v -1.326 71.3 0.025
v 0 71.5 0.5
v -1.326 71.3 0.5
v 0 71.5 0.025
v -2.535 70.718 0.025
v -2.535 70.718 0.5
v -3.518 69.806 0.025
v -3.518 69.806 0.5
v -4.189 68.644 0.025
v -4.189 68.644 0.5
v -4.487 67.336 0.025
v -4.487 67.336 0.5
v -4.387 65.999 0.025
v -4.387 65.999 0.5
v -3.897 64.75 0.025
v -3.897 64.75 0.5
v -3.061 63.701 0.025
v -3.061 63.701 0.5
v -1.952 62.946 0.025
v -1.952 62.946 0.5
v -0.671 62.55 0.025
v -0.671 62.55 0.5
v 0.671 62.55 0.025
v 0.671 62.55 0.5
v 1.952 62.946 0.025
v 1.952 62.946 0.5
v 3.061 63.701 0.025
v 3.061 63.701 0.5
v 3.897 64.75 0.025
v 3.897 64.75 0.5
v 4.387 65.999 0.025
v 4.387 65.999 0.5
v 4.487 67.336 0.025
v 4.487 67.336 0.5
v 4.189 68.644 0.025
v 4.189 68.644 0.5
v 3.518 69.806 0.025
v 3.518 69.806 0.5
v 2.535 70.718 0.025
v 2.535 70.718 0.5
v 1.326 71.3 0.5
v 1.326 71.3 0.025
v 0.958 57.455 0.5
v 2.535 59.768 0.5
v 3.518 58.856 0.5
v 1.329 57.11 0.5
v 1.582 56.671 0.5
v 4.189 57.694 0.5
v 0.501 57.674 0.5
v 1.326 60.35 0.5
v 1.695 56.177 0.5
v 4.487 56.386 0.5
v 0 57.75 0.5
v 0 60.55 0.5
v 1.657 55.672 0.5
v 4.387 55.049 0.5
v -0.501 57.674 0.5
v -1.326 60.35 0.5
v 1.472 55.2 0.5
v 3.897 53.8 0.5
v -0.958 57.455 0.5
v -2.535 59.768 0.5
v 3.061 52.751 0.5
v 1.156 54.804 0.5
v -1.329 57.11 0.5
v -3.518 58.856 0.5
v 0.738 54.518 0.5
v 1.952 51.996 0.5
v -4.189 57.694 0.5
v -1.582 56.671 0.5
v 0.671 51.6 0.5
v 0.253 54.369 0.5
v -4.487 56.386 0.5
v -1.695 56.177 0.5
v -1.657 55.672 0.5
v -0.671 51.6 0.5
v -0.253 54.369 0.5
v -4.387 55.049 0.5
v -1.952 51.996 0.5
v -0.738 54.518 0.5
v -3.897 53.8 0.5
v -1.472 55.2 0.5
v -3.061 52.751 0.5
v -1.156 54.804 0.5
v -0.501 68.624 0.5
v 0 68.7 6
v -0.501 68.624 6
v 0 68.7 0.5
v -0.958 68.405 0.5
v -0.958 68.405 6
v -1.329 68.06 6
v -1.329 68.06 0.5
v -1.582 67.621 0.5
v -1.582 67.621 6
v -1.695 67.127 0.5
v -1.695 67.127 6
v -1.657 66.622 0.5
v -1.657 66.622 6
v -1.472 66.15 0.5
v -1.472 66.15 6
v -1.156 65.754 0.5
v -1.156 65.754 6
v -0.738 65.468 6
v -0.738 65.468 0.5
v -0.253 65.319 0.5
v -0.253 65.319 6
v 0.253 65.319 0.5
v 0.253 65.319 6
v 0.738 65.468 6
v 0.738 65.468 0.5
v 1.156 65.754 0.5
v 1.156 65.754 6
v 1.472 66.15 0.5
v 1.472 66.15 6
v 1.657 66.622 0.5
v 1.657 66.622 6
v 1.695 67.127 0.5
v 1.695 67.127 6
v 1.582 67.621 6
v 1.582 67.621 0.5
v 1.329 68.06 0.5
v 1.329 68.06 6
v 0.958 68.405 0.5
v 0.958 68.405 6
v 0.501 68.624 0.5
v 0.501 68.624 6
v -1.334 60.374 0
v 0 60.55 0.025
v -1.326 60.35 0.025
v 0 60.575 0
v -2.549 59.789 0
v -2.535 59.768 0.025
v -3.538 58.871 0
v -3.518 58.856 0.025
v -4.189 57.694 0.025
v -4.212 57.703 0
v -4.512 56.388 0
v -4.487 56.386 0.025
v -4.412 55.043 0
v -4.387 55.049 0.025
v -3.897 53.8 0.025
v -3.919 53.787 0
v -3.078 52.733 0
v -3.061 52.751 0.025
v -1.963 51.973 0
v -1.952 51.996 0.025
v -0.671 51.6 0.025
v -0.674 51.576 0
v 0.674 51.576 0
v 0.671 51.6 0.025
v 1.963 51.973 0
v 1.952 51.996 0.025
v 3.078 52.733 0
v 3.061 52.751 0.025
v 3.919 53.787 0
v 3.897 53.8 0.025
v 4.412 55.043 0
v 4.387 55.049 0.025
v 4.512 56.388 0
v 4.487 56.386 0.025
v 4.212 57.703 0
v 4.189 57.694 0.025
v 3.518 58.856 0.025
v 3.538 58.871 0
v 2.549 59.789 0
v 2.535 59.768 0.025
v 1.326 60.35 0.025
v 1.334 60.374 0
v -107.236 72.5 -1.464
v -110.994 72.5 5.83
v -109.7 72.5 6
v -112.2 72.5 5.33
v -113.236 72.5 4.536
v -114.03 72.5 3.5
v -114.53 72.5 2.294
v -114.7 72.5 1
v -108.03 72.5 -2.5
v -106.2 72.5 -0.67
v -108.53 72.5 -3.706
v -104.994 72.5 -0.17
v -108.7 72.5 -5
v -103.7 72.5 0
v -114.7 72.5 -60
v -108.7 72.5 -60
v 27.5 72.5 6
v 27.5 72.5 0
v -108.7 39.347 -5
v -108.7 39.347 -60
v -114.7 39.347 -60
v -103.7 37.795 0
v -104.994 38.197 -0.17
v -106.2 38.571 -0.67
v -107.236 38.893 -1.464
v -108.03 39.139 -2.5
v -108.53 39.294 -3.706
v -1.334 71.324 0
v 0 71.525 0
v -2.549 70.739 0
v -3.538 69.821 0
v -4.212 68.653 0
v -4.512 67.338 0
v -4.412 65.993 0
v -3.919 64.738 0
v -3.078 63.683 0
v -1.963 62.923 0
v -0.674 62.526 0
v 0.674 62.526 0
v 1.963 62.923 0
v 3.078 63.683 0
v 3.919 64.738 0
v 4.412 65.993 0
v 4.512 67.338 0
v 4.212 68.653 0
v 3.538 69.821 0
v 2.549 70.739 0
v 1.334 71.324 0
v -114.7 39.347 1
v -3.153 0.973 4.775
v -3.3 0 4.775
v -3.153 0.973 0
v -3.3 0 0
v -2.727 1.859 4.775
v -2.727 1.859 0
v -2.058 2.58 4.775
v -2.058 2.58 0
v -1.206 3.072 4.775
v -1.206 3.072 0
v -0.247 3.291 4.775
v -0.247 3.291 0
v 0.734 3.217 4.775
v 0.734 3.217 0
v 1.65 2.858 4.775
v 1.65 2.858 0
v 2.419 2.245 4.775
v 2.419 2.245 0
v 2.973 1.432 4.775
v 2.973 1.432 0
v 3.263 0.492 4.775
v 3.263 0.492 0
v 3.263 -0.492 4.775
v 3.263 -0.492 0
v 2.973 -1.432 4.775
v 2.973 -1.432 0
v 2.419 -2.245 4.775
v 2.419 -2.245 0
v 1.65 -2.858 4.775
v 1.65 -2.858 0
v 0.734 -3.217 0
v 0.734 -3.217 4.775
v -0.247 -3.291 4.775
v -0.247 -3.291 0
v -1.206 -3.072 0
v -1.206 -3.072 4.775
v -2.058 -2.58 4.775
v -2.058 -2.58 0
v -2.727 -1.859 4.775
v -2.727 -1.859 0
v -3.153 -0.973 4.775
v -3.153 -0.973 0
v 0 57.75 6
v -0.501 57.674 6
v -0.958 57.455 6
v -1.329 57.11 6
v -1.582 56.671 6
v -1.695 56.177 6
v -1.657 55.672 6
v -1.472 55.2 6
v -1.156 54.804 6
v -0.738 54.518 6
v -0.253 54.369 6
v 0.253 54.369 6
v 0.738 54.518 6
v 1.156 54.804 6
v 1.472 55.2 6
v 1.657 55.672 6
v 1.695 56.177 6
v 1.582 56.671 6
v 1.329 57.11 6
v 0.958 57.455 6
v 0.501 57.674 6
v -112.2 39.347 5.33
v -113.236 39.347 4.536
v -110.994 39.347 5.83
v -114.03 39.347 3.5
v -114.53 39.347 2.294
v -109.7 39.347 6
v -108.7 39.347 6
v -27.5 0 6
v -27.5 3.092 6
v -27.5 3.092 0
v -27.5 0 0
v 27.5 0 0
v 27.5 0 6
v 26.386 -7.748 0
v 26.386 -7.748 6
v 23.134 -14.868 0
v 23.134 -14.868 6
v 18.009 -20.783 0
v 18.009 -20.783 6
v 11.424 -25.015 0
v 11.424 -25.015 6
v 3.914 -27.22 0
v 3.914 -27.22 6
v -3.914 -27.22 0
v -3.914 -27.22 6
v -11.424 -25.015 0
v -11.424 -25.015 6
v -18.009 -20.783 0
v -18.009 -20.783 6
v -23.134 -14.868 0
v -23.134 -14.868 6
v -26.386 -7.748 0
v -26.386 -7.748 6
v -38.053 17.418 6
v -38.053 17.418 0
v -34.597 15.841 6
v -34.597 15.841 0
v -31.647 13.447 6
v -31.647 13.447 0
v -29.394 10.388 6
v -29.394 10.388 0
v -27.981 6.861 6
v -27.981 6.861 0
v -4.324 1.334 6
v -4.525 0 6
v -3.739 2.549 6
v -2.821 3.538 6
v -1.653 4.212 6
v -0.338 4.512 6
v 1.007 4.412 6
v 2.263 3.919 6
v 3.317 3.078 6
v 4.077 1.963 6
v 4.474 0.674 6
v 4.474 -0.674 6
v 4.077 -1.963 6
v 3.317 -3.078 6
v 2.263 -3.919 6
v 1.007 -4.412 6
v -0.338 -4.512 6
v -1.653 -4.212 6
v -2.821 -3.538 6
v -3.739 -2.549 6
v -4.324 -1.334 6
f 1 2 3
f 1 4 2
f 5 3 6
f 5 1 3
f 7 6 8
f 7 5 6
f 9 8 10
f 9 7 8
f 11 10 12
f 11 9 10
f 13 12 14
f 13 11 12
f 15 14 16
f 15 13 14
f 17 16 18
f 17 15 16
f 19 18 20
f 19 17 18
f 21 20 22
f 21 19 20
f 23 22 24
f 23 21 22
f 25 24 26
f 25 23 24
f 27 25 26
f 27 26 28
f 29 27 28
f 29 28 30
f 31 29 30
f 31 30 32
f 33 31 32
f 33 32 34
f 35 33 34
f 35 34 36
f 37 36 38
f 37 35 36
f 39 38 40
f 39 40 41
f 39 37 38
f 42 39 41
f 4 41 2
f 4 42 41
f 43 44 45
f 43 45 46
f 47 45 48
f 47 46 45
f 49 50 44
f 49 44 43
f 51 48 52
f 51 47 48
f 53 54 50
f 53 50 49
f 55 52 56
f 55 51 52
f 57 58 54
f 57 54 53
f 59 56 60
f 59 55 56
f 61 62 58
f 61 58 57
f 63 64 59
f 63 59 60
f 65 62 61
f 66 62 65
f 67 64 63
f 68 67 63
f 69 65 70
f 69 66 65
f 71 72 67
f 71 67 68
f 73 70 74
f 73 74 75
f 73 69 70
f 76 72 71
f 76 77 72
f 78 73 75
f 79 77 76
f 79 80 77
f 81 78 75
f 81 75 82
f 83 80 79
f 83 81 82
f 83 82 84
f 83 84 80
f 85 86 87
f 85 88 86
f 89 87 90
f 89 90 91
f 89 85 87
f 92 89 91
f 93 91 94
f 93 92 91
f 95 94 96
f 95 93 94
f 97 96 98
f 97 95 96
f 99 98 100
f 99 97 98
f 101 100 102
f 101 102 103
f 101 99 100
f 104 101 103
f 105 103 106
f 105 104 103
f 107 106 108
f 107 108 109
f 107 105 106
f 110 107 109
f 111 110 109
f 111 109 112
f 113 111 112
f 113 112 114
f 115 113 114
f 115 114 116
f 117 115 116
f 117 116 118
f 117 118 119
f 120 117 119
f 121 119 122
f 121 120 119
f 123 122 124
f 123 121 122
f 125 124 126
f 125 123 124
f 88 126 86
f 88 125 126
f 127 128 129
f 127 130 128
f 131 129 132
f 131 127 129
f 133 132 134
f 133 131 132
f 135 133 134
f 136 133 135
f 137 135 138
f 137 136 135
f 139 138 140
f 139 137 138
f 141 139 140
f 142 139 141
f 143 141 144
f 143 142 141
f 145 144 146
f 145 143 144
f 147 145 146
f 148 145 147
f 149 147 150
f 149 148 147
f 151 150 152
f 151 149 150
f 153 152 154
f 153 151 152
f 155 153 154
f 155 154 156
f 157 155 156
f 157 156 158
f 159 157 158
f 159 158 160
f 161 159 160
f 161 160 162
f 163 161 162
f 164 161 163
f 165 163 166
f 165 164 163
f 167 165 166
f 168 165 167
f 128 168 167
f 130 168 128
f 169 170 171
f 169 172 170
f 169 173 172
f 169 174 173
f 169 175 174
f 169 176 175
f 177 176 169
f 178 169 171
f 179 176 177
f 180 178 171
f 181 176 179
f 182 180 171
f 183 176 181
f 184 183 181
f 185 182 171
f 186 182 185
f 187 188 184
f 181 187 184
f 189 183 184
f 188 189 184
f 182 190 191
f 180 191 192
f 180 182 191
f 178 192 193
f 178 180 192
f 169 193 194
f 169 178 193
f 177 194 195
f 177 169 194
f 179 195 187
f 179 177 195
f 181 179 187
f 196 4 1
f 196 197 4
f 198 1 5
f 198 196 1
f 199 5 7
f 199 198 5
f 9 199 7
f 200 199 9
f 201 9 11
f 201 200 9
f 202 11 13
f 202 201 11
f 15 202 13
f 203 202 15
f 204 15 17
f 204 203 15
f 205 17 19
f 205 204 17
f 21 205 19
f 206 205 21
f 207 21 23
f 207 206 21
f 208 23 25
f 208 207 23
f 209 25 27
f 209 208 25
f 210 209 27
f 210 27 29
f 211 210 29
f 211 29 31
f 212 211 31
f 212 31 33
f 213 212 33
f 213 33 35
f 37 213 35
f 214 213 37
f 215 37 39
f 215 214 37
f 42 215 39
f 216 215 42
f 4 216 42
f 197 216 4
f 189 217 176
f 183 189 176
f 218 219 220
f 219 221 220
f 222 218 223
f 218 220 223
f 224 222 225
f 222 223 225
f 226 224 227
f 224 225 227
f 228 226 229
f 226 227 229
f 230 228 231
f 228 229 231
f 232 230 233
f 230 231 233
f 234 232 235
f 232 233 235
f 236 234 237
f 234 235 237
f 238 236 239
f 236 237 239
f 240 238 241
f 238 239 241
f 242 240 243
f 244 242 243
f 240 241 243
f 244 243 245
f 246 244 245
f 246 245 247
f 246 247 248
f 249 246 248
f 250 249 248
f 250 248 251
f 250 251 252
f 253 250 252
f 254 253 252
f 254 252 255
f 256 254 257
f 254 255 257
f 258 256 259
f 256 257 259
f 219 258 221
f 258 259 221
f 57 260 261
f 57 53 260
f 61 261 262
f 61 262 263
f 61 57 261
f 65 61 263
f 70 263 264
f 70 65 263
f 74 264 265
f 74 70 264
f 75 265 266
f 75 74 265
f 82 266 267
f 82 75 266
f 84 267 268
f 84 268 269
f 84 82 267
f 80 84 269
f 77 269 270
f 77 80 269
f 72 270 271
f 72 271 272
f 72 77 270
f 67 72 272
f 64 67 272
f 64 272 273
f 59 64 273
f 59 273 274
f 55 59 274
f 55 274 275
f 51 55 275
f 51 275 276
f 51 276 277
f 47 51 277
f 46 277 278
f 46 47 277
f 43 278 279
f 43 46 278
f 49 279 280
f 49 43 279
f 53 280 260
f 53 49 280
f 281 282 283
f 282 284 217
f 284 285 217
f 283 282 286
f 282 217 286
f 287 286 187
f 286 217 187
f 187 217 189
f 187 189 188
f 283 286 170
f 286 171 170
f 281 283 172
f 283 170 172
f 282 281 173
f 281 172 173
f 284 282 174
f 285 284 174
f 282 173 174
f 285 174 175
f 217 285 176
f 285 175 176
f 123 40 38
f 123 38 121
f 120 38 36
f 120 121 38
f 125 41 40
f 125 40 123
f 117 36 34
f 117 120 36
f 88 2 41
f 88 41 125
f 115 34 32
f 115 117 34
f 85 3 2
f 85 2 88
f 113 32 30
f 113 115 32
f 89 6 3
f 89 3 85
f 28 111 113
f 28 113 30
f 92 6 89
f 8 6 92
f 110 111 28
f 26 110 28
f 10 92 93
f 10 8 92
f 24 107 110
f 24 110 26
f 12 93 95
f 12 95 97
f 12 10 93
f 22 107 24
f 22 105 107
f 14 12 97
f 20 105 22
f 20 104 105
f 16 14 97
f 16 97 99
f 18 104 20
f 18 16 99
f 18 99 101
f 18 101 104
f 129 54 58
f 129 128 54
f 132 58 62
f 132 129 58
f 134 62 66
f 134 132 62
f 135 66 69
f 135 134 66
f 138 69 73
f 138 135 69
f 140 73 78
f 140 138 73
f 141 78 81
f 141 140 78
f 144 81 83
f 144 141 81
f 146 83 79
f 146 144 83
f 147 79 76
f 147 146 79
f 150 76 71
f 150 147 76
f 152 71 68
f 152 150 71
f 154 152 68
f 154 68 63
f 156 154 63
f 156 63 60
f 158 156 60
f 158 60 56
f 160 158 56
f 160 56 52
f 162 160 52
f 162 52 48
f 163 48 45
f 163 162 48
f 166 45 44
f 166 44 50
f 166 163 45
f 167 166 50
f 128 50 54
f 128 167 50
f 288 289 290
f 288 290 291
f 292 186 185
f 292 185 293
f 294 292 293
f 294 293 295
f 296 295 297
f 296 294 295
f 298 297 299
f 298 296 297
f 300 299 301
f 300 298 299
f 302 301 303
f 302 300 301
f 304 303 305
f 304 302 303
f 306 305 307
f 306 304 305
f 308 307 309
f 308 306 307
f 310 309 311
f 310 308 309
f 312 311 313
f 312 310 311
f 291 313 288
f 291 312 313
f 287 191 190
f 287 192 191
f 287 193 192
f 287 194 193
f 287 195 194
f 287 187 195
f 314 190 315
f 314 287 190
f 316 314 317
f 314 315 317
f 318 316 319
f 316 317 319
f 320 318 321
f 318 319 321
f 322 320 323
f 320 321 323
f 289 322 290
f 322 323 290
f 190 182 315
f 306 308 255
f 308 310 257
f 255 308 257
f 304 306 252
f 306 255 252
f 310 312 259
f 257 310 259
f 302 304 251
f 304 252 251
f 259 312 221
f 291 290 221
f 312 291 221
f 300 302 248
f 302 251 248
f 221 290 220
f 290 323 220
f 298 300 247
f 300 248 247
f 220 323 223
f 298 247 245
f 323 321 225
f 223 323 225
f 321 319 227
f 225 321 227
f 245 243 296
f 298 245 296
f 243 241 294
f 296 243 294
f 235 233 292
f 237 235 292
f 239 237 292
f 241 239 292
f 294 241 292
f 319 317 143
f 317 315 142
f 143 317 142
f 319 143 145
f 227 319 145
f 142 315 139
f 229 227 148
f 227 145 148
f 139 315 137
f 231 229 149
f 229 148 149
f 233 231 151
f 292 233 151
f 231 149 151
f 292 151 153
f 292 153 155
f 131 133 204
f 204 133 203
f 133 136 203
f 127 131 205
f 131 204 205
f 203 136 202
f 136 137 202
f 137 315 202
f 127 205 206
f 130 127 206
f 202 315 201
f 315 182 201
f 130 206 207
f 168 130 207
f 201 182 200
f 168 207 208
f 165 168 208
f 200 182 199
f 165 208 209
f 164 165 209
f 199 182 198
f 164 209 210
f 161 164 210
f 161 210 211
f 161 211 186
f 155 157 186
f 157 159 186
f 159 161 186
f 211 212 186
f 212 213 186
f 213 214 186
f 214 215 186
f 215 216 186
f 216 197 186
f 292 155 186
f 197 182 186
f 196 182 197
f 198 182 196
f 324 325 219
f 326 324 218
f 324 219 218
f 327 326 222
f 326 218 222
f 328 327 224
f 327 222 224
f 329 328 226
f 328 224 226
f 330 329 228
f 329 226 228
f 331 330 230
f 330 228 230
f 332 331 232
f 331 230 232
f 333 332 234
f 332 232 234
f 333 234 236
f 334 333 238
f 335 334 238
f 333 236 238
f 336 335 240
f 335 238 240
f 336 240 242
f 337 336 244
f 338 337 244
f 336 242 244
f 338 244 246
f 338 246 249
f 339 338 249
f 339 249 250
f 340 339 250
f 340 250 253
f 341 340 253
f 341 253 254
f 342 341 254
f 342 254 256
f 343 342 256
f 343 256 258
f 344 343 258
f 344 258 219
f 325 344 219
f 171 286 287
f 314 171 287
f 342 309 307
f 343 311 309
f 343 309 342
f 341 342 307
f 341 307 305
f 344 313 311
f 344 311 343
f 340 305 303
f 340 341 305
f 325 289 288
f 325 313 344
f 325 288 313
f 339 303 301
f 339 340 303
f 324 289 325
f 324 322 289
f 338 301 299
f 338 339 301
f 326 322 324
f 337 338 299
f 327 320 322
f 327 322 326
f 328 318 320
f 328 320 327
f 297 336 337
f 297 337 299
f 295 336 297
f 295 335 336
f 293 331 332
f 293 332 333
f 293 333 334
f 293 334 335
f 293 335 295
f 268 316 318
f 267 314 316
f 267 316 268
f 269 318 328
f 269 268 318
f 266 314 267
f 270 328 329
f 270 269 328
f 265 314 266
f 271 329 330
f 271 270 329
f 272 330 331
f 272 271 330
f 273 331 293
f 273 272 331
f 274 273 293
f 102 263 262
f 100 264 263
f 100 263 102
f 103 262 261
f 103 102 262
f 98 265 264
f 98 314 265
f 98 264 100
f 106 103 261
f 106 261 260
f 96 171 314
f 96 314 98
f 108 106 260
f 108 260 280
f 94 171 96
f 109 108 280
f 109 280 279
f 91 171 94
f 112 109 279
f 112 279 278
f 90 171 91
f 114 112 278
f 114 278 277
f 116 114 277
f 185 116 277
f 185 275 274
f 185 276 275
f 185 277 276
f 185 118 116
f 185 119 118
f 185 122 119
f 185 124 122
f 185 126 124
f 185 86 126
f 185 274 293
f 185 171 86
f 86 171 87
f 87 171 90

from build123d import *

# Parameters (mm, degrees)
ESTRUSIONE_ESTRUSIONE1_DEPTH                 = 6
SCHIZZO3_W                                   = 136.2
SCHIZZO3_H                                   = 72.5
ESTRUSIONE_ESTRUSIONE2_DEPTH                 = 6
TAGLIO_ESTRUSIONE1_DEPTH                     = 131.797324132
RACCORDO5_R                                  = 15
ESTRUSIONE_ESTRUSIONE5_DEPTH                 = 6
ESTRUSIONE_ESTRUSIONE5_DEPTH_BACK            = 60
SCHIZZO9_W                                   = 6
SCHIZZO9_H                                   = 33.15279029
RACCORDO6_R                                  = 5
RACCORDO7_R                                  = 5
FORO_FILETTATO_G1_16_1_D                     = 6.6
FORO_FILETTATO_G1_16_1_CSINK_D               = 9.05
FORO_FILETTATO_G1_16_1_CSINK_ANGLE           = 90
FORO_LAMATO_PER_BULLONE_M3_A_TESTA_E_2_COUNT = 2
FORO_LAMATO_PER_BULLONE_M3_A_TESTA_E_2_PITCH = 10.95


with BuildPart() as part:
    # Schizzo2 → Estrusione-Estrusione1 (new body)
    with BuildSketch(Plane.XY):
        with BuildLine():
            Line((-27.5, 0), (-27.5, 45))
            ThreePointArc((-27.5, 45), (0, 72.5), (27.5, 45))
            Line((27.5, 45), (27.5, 0))
            ThreePointArc((27.5, 0), (0, -27.5), (-27.5, 0))
        make_face()
    extrude(amount=ESTRUSIONE_ESTRUSIONE1_DEPTH)

    # Schizzo3 → Estrusione-Estrusione2 (add)
    with BuildSketch(Plane.XY):
        with Locations((-40.6, 36.25)):
            Rectangle(SCHIZZO3_W, SCHIZZO3_H)
    extrude(amount=ESTRUSIONE_ESTRUSIONE2_DEPTH)

    # Schizzo4 → Taglio-Estrusione1 (cut, through all)
    with BuildSketch(Plane.XY.offset(6)):
        Polygon((-27.5, 0), (-108.7, 0), (-108.7, 39.34720971), (-27.5, 14.142426235), align=None)
    extrude(amount=-TAGLIO_ESTRUSIONE1_DEPTH, mode=Mode.SUBTRACT)

    # Raccordo5
    raccordo5_edges = [part.edges().sort_by_distance(p)[0] for p in [
        (-27.5, 14.142426235, 3),
    ]]
    fillet(raccordo5_edges, radius=RACCORDO5_R)

    # Schizzo9 → Estrusione-Estrusione5 (add, two sides: drawn at the far end of the back side and taken through both)
    with BuildSketch(Plane.XY.offset(-ESTRUSIONE_ESTRUSIONE5_DEPTH_BACK)):
        with Locations((-111.7, 55.923604855)):
            Rectangle(SCHIZZO9_W, SCHIZZO9_H)
    extrude(amount=ESTRUSIONE_ESTRUSIONE5_DEPTH + ESTRUSIONE_ESTRUSIONE5_DEPTH_BACK)

    # Raccordo6
    raccordo6_edges = [part.edges().sort_by_distance(p)[0] for p in [
        (-108.7, 55.923604855, 0),
    ]]
    fillet(raccordo6_edges, radius=RACCORDO6_R)

    # Raccordo7
    raccordo7_edges = [part.edges().sort_by_distance(p)[0] for p in [
        (-114.7, 55.923604855, 6),
    ]]
    fillet(raccordo7_edges, radius=RACCORDO7_R)

    # Foro filettato G1/16-1 (through all)
    with Locations(Plane.XY.offset(6)):
        with Locations((0, 0)):
            CounterSinkHole(FORO_FILETTATO_G1_16_1_D / 2, FORO_FILETTATO_G1_16_1_CSINK_D / 2, counter_sink_angle=FORO_FILETTATO_G1_16_1_CSINK_ANGLE)

    # Schizzo20 → Foro lamato per Bullone M3 a testa esagonale-3 (revolve, cut)
    with BuildSketch(Plane(origin=(0, 67, 0), x_dir=(0, 1, 0), z_dir=(1, 0, 0))):
        Polygon((0, 0), (0, 6), (1.7, 6), (1.7, 0.5), (4.5, 0.5), (4.5, 0.025), (4.525, 0), align=None)
    foro_lamato_per_bullone_m3_a_testa_esago = revolve(axis=Axis((0, 67, -6.35), (0, 0, 1)), mode=Mode.SUBTRACT)

    # Foro lamato per Bullone M3 a testa e 2: Foro lamato per Bullone M3 a testa esagonale-3 ×2
    with Locations(*[(0, -i * FORO_LAMATO_PER_BULLONE_M3_A_TESTA_E_2_PITCH, 0) for i in range(1, FORO_LAMATO_PER_BULLONE_M3_A_TESTA_E_2_COUNT)]):
        add(foro_lamato_per_bullone_m3_a_testa_esago, mode=Mode.SUBTRACT)


solid = part.part
